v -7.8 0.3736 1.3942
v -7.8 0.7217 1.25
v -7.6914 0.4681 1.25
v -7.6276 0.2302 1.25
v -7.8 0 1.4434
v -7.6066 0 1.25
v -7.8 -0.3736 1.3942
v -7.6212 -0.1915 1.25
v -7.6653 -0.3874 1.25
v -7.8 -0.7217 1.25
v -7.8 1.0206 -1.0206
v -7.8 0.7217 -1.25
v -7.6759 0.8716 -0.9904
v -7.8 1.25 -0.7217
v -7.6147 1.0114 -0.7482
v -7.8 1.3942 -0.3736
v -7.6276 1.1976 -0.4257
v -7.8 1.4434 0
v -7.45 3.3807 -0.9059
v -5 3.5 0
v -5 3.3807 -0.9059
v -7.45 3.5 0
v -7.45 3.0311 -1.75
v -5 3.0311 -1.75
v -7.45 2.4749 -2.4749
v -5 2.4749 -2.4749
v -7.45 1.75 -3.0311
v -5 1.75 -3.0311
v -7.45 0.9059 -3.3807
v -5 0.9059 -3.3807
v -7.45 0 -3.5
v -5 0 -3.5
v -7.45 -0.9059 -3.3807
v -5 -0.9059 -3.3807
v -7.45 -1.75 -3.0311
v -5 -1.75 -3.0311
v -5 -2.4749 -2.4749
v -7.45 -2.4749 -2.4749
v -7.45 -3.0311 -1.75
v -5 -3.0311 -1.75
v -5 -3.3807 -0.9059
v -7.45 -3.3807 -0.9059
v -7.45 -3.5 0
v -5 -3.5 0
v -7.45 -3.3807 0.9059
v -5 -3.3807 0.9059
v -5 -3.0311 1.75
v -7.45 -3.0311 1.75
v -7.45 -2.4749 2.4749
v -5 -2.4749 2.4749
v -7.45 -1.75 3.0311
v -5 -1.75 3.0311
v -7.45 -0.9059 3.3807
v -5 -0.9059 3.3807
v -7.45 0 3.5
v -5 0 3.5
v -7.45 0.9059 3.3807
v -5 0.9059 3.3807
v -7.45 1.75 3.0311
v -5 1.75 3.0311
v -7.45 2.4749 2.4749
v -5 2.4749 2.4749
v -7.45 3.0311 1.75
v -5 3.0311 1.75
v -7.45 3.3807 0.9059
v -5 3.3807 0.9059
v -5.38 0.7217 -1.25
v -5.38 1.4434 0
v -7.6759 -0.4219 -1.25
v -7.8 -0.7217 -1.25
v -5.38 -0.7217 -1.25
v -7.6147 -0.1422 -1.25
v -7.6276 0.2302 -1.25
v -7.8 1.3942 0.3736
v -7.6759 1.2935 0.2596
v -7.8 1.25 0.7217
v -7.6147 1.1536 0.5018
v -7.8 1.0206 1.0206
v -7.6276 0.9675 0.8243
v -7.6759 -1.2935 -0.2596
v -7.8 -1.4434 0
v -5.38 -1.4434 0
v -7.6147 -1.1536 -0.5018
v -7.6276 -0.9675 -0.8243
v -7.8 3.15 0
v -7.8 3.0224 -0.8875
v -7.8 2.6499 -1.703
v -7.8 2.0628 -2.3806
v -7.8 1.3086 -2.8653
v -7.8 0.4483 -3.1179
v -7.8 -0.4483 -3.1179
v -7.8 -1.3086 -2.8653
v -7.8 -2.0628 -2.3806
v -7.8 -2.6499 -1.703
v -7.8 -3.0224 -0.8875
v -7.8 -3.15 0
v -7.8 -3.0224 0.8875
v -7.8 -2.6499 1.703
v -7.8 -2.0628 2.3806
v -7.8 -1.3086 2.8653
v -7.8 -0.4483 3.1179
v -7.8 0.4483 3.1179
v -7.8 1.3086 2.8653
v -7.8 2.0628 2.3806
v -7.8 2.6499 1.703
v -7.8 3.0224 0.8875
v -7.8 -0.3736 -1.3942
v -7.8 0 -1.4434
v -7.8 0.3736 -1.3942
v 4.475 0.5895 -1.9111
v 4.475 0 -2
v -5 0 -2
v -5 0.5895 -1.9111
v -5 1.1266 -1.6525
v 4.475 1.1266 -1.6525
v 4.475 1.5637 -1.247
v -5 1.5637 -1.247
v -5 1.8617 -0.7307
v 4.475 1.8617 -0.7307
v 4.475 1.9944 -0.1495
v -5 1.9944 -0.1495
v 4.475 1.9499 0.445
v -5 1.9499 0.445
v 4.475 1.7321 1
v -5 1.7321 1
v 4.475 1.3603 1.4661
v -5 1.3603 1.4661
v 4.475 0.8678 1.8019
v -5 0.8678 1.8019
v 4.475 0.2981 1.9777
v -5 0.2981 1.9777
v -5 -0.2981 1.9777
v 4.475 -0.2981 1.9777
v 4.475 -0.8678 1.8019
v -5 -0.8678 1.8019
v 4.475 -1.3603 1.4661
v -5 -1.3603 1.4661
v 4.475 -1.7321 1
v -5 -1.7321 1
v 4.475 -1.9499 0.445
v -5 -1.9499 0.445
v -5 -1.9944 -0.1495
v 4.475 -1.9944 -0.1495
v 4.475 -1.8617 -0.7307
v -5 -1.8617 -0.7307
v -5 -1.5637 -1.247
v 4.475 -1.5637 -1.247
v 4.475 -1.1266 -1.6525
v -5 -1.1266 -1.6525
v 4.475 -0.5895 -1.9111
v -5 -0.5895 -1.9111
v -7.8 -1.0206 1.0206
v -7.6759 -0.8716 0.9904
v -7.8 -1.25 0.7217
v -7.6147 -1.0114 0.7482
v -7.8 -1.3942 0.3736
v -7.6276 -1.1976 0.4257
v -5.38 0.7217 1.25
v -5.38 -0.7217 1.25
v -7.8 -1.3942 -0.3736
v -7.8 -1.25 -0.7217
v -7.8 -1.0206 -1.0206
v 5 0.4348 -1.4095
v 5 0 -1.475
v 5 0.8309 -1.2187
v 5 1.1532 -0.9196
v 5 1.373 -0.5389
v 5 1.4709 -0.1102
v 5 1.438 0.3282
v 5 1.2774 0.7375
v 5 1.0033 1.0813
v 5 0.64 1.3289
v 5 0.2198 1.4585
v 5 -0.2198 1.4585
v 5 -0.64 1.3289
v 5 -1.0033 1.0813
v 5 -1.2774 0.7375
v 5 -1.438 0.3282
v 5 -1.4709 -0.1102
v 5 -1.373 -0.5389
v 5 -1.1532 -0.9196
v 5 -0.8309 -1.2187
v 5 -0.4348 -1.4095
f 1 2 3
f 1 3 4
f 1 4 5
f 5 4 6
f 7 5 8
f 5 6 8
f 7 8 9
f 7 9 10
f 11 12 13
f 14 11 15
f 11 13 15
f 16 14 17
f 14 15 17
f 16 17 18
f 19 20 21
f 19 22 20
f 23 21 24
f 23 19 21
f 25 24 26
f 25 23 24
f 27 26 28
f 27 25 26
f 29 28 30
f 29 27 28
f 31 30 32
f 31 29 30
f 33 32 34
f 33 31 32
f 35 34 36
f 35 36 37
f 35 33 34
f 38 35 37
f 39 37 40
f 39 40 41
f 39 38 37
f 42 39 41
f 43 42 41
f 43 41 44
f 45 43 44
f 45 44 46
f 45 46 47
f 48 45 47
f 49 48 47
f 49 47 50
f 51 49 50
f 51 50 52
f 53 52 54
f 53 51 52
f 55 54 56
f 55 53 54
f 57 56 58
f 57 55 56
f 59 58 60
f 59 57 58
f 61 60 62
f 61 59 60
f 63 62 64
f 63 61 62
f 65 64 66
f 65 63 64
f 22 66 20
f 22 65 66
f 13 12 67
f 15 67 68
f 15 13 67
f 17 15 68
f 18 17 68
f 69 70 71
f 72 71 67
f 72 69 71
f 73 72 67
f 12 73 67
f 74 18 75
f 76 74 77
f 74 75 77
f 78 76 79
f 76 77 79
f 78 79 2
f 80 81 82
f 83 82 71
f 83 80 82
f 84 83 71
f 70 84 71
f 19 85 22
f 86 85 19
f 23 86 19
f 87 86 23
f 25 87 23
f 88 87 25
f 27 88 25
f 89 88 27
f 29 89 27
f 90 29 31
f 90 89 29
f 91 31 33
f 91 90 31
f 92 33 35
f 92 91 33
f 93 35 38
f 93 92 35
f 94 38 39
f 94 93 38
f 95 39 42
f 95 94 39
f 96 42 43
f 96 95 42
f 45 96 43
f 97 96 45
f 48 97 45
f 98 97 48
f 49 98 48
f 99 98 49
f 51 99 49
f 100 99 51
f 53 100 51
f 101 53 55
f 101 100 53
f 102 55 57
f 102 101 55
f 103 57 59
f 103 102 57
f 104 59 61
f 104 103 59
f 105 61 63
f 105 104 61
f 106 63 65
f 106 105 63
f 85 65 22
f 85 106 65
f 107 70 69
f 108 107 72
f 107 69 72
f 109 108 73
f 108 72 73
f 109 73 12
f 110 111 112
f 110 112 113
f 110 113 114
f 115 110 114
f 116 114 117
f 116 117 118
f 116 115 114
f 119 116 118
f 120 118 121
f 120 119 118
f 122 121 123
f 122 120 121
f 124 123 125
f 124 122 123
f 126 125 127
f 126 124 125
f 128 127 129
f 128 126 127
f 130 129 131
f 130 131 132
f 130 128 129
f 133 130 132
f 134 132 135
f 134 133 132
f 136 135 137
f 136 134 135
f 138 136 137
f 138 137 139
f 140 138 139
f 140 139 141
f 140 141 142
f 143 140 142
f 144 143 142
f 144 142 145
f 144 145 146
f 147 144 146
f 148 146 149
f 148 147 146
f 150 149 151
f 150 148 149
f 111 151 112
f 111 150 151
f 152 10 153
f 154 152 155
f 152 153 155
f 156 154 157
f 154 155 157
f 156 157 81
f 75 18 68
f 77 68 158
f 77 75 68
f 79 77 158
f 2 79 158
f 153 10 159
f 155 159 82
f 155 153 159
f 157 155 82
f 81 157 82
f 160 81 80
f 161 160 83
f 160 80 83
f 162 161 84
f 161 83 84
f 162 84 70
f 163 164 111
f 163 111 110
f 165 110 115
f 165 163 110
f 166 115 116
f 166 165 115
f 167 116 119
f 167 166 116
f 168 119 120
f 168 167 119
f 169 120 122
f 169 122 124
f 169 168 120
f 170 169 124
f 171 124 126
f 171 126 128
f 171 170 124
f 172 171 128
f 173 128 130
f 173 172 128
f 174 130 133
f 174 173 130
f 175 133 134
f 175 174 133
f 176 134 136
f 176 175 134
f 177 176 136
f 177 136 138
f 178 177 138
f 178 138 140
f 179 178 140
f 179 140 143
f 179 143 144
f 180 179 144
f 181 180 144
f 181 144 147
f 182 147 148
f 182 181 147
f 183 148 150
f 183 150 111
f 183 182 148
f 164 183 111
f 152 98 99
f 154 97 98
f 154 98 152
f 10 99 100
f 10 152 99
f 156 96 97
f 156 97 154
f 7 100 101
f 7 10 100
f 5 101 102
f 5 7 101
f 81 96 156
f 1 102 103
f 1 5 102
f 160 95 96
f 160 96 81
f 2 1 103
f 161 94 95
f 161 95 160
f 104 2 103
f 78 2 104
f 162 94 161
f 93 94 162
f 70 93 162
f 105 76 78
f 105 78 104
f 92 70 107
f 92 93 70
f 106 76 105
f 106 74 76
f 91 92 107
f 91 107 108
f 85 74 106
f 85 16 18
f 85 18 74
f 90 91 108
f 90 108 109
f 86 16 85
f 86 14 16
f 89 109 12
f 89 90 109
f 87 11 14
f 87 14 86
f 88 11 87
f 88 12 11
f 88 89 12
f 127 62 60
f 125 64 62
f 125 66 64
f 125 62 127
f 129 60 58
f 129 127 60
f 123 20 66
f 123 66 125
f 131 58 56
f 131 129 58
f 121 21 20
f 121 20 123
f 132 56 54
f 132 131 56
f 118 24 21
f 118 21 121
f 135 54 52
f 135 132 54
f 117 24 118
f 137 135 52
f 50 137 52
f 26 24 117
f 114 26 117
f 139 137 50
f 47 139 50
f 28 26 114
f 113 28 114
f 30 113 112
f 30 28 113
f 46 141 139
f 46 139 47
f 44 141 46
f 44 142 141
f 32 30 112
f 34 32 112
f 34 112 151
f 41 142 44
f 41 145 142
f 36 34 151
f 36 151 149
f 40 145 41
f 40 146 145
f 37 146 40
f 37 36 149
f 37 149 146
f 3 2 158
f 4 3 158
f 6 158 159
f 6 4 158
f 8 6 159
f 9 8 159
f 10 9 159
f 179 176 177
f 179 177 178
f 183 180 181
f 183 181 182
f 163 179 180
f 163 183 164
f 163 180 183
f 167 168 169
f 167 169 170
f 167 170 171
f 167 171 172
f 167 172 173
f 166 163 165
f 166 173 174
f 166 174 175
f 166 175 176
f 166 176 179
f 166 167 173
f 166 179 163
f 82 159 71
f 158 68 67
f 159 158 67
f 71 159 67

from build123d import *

# Parameters (mm, degrees)
SKETCH2_R           = 2
BOSS_EXTRUDE1_DEPTH = 10
CHAMFER1_SIZE       = 0.525
CUT_EXTRUDE1_DEPTH  = 2.42


with BuildPart() as part:
    # Sketch2 → Boss-Extrude1 (new body)
    with BuildSketch(Plane(origin=(5, 0, 0), x_dir=(0, 0, -1), z_dir=(1, 0, 0))):
        Circle(SKETCH2_R)
    extrude(amount=-BOSS_EXTRUDE1_DEPTH)

    # Chamfer1
    chamfer1_edges = [part.edges().sort_by_distance(p)[0] for p in [
        (5, 0, 2),
    ]]
    chamfer(chamfer1_edges, length=CHAMFER1_SIZE)

    # Sketch6 → Revolve1 (revolve)
    with BuildSketch(Plane.XY):
        Polygon((-7.45, 3.5), (-7.8, 3.15), (-7.8, 0), (-5, 0), (-5, 3.5), align=None)
    revolve(axis=Axis((-5, 0, 0), (-1, 0, 0)))

    # Sketch4 → Cut-Extrude1 (cut)
    with BuildSketch(Plane(origin=(-7.8, 0, 0), x_dir=(0, 0, -1), z_dir=(1, 0, 0))):
        Polygon((0, 1.443375673), (-1.25, 0.721687836), (-1.25, -0.721687836), (0, -1.443375673), (1.25, -0.721687836), (1.25, 0.721687836), align=None)
    extrude(amount=CUT_EXTRUDE1_DEPTH, mode=Mode.SUBTRACT)

    # Cut-Extrude2 cone 1 section (through the dimple's axis) → Cut-Extrude2 (revolve, cut)
    with BuildSketch(Plane(origin=(-7.8, 0, 0), x_dir=(0, 0, 1), z_dir=(0, 1, 0))):
        Polygon((0, 0), (1.443375673, 0), (0, 1.443375673), align=None)
    revolve(axis=Axis((-7.8, 0, 0), (1, 0, 0)), mode=Mode.SUBTRACT)


solid = part.part
